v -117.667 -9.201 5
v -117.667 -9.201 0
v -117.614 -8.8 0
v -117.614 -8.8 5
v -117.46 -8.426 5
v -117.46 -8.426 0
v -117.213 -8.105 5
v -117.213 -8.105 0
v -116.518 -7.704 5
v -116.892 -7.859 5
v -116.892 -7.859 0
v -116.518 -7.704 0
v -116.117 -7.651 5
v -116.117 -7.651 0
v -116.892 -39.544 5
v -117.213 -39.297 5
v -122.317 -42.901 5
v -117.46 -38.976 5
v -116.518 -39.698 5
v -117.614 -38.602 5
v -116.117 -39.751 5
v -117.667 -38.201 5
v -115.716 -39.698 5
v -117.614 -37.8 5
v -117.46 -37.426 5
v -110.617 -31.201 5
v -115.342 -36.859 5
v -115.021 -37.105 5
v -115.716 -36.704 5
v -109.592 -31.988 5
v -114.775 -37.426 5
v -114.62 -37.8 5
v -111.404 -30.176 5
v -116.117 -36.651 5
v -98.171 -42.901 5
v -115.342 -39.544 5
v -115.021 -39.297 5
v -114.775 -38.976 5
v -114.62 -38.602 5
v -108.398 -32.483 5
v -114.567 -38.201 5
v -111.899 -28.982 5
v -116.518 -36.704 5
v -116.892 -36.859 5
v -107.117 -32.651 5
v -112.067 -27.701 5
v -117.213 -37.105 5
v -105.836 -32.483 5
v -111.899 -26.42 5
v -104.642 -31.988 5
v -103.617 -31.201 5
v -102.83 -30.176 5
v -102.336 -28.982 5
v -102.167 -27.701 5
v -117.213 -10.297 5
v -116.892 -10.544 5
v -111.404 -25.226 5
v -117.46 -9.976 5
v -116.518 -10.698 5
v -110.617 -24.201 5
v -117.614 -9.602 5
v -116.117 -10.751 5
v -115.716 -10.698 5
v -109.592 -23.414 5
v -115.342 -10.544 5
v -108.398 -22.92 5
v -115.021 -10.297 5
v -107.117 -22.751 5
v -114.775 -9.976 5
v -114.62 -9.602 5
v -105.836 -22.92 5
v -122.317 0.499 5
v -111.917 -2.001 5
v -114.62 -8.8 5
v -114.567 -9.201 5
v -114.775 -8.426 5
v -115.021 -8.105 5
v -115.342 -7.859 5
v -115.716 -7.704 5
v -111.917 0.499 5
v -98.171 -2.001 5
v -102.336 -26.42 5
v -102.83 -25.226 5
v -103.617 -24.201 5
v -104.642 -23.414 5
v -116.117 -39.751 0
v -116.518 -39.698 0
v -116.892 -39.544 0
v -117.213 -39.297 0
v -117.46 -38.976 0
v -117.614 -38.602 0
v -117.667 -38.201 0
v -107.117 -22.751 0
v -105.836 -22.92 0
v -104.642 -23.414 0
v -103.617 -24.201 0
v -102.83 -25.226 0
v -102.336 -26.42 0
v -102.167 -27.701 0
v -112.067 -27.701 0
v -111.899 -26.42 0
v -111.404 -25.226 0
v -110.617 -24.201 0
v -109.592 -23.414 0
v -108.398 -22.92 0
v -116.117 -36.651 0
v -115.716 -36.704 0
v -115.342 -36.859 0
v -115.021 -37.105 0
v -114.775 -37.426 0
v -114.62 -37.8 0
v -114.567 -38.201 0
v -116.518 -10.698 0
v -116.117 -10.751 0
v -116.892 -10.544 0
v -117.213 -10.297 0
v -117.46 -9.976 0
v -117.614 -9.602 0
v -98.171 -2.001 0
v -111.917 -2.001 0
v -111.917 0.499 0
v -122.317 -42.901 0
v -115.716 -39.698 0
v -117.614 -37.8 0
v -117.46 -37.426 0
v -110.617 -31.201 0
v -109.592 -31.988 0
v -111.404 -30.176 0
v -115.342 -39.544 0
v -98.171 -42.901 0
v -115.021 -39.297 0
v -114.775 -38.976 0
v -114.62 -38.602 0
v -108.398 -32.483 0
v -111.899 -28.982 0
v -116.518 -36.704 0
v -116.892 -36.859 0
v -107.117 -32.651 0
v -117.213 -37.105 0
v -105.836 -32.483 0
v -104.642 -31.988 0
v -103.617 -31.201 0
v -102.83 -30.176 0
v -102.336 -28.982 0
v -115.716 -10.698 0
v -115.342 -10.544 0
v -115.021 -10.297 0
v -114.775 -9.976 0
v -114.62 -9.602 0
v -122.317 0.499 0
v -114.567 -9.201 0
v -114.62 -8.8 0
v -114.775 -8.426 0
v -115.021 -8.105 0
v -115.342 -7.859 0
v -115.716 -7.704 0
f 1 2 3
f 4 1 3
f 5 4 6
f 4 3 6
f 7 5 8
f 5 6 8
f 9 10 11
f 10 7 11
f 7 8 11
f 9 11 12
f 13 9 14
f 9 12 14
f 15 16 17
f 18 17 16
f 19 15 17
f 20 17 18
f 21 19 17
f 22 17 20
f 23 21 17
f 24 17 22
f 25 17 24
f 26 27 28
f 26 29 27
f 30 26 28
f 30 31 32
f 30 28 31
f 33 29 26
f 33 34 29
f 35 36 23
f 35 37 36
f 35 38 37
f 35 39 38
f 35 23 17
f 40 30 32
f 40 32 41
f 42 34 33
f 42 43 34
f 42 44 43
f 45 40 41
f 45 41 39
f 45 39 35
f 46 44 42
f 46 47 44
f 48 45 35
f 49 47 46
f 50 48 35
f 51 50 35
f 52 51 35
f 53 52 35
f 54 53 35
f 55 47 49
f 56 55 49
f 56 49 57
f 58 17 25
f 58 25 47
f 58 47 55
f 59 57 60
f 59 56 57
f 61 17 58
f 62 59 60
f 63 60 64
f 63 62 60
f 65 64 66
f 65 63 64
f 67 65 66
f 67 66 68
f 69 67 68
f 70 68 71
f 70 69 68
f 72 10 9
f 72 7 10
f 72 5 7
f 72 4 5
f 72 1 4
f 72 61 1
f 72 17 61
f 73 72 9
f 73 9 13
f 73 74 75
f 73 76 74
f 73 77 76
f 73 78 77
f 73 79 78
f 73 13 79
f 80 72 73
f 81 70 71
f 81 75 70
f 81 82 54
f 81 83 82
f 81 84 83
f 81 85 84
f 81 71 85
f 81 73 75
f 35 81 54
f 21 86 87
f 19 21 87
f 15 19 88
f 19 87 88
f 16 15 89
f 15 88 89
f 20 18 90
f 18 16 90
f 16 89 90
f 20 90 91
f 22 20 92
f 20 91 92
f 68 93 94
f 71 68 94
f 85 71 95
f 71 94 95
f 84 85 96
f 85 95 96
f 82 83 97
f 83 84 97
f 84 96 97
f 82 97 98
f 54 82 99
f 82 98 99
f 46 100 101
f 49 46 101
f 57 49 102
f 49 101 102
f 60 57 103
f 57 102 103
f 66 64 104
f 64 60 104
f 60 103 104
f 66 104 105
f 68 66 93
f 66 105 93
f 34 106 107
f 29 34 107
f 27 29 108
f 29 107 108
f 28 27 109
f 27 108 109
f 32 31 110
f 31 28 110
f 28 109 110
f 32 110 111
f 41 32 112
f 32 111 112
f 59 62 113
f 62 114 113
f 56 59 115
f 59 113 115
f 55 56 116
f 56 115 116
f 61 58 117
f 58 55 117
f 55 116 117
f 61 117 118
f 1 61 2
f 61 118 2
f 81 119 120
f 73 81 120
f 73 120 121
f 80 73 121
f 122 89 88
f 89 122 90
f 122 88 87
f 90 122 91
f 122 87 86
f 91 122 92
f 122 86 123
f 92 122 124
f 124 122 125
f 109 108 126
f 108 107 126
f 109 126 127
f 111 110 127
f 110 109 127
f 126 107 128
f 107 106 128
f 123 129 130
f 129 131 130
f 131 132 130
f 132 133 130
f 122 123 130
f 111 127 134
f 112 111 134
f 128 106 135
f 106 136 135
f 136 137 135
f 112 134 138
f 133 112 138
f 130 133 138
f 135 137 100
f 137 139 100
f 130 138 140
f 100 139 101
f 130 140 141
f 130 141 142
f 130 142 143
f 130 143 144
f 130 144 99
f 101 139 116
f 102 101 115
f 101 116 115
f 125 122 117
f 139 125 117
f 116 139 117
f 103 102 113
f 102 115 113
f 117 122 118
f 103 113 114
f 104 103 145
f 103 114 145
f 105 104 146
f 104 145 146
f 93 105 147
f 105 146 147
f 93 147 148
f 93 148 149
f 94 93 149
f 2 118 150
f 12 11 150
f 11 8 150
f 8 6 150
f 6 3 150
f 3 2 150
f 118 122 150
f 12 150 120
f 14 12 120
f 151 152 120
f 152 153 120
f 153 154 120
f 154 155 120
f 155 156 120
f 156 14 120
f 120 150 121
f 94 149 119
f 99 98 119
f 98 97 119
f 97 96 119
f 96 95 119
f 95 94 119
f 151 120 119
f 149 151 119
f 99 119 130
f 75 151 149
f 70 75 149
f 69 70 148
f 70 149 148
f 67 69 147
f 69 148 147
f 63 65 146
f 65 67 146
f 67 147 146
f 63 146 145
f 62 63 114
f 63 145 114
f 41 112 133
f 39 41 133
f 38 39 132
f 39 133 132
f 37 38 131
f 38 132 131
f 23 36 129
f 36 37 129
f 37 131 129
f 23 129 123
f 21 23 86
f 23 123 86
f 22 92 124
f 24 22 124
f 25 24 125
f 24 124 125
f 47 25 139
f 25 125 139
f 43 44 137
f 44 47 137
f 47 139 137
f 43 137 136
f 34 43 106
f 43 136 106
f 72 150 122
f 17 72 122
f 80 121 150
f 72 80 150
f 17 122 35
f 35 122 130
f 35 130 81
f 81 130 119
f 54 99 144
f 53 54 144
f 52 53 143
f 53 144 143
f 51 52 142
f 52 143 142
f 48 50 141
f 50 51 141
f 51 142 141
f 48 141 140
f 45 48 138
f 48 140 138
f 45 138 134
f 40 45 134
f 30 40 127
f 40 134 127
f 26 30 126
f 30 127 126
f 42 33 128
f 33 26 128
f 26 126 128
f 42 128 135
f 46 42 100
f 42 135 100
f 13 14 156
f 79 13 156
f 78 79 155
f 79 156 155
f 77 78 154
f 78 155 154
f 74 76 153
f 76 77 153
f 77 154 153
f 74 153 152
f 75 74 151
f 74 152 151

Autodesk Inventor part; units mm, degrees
ref_plane "YZ Plane" through (0, 0, 0) normal (1, 0, 0) x (0, 1, 0)
ref_plane "XZ Plane" through (0, 0, 0) normal (0, 1, 0) x (-1, 0, 0)
ref_plane "XY Plane" through (0, 0, 0) normal (0, 0, 1) x (1, 0, 0)
sketch "Boceto1" plane through (0, 0, 0) normal (0, 0, 1) x (1, 0, 0)
  arc A0 (-116.1173, -7.6512) -> (-117.6673, -9.2012) centre (-116.1173, -9.2012) ccw
  arc A1 (-117.6673, -9.2012) -> (-116.1173, -10.7512) centre (-116.1173, -9.2012) ccw
  arc A2 (-116.1173, -10.7512) -> (-114.5673, -9.2012) centre (-116.1173, -9.2012) ccw
  arc A3 (-114.5673, -9.2012) -> (-116.1173, -7.6512) centre (-116.1173, -9.2012) ccw
  arc A4 (-116.1173, -36.6512) -> (-117.6673, -38.2012) centre (-116.1173, -38.2012) ccw
  arc A5 (-117.6673, -38.2012) -> (-116.1173, -39.7512) centre (-116.1173, -38.2012) ccw
  arc A6 (-116.1173, -39.7512) -> (-114.5673, -38.2012) centre (-116.1173, -38.2012) ccw
  arc A7 (-114.5673, -38.2012) -> (-116.1173, -36.6512) centre (-116.1173, -38.2012) ccw
  arc A8 (-107.1173, -22.7512) -> (-112.0673, -27.7012) centre (-107.1173, -27.7012) ccw
  arc A9 (-112.0673, -27.7012) -> (-107.1173, -32.6512) centre (-107.1173, -27.7012) ccw
  arc A10 (-107.1173, -32.6512) -> (-102.1673, -27.7012) centre (-107.1173, -27.7012) ccw
  arc A11 (-102.1673, -27.7012) -> (-107.1173, -22.7512) centre (-107.1173, -27.7012) ccw
  line L0 (-98.1709, -2.0012) -> (-111.9173, -2.0012)
  line L1 (-111.9173, -2.0012) -> (-111.9173, 0.4988)
  line L2 (-111.9173, 0.4988) -> (-122.3173, 0.4988)
  line L3 (-122.3173, 0.4988) -> (-122.3173, -42.9012)
  line L4 (-122.3173, -42.9012) -> (-98.1709, -42.9012)
  line L5 (-98.1709, -42.9012) -> (-98.1709, -2.0012)
  point P0 (0, 0)
extrude "Extrusión1" add sketch "Boceto1" along normal blind 5
properties part number "carro x lado motor pieza 2 especial2"
